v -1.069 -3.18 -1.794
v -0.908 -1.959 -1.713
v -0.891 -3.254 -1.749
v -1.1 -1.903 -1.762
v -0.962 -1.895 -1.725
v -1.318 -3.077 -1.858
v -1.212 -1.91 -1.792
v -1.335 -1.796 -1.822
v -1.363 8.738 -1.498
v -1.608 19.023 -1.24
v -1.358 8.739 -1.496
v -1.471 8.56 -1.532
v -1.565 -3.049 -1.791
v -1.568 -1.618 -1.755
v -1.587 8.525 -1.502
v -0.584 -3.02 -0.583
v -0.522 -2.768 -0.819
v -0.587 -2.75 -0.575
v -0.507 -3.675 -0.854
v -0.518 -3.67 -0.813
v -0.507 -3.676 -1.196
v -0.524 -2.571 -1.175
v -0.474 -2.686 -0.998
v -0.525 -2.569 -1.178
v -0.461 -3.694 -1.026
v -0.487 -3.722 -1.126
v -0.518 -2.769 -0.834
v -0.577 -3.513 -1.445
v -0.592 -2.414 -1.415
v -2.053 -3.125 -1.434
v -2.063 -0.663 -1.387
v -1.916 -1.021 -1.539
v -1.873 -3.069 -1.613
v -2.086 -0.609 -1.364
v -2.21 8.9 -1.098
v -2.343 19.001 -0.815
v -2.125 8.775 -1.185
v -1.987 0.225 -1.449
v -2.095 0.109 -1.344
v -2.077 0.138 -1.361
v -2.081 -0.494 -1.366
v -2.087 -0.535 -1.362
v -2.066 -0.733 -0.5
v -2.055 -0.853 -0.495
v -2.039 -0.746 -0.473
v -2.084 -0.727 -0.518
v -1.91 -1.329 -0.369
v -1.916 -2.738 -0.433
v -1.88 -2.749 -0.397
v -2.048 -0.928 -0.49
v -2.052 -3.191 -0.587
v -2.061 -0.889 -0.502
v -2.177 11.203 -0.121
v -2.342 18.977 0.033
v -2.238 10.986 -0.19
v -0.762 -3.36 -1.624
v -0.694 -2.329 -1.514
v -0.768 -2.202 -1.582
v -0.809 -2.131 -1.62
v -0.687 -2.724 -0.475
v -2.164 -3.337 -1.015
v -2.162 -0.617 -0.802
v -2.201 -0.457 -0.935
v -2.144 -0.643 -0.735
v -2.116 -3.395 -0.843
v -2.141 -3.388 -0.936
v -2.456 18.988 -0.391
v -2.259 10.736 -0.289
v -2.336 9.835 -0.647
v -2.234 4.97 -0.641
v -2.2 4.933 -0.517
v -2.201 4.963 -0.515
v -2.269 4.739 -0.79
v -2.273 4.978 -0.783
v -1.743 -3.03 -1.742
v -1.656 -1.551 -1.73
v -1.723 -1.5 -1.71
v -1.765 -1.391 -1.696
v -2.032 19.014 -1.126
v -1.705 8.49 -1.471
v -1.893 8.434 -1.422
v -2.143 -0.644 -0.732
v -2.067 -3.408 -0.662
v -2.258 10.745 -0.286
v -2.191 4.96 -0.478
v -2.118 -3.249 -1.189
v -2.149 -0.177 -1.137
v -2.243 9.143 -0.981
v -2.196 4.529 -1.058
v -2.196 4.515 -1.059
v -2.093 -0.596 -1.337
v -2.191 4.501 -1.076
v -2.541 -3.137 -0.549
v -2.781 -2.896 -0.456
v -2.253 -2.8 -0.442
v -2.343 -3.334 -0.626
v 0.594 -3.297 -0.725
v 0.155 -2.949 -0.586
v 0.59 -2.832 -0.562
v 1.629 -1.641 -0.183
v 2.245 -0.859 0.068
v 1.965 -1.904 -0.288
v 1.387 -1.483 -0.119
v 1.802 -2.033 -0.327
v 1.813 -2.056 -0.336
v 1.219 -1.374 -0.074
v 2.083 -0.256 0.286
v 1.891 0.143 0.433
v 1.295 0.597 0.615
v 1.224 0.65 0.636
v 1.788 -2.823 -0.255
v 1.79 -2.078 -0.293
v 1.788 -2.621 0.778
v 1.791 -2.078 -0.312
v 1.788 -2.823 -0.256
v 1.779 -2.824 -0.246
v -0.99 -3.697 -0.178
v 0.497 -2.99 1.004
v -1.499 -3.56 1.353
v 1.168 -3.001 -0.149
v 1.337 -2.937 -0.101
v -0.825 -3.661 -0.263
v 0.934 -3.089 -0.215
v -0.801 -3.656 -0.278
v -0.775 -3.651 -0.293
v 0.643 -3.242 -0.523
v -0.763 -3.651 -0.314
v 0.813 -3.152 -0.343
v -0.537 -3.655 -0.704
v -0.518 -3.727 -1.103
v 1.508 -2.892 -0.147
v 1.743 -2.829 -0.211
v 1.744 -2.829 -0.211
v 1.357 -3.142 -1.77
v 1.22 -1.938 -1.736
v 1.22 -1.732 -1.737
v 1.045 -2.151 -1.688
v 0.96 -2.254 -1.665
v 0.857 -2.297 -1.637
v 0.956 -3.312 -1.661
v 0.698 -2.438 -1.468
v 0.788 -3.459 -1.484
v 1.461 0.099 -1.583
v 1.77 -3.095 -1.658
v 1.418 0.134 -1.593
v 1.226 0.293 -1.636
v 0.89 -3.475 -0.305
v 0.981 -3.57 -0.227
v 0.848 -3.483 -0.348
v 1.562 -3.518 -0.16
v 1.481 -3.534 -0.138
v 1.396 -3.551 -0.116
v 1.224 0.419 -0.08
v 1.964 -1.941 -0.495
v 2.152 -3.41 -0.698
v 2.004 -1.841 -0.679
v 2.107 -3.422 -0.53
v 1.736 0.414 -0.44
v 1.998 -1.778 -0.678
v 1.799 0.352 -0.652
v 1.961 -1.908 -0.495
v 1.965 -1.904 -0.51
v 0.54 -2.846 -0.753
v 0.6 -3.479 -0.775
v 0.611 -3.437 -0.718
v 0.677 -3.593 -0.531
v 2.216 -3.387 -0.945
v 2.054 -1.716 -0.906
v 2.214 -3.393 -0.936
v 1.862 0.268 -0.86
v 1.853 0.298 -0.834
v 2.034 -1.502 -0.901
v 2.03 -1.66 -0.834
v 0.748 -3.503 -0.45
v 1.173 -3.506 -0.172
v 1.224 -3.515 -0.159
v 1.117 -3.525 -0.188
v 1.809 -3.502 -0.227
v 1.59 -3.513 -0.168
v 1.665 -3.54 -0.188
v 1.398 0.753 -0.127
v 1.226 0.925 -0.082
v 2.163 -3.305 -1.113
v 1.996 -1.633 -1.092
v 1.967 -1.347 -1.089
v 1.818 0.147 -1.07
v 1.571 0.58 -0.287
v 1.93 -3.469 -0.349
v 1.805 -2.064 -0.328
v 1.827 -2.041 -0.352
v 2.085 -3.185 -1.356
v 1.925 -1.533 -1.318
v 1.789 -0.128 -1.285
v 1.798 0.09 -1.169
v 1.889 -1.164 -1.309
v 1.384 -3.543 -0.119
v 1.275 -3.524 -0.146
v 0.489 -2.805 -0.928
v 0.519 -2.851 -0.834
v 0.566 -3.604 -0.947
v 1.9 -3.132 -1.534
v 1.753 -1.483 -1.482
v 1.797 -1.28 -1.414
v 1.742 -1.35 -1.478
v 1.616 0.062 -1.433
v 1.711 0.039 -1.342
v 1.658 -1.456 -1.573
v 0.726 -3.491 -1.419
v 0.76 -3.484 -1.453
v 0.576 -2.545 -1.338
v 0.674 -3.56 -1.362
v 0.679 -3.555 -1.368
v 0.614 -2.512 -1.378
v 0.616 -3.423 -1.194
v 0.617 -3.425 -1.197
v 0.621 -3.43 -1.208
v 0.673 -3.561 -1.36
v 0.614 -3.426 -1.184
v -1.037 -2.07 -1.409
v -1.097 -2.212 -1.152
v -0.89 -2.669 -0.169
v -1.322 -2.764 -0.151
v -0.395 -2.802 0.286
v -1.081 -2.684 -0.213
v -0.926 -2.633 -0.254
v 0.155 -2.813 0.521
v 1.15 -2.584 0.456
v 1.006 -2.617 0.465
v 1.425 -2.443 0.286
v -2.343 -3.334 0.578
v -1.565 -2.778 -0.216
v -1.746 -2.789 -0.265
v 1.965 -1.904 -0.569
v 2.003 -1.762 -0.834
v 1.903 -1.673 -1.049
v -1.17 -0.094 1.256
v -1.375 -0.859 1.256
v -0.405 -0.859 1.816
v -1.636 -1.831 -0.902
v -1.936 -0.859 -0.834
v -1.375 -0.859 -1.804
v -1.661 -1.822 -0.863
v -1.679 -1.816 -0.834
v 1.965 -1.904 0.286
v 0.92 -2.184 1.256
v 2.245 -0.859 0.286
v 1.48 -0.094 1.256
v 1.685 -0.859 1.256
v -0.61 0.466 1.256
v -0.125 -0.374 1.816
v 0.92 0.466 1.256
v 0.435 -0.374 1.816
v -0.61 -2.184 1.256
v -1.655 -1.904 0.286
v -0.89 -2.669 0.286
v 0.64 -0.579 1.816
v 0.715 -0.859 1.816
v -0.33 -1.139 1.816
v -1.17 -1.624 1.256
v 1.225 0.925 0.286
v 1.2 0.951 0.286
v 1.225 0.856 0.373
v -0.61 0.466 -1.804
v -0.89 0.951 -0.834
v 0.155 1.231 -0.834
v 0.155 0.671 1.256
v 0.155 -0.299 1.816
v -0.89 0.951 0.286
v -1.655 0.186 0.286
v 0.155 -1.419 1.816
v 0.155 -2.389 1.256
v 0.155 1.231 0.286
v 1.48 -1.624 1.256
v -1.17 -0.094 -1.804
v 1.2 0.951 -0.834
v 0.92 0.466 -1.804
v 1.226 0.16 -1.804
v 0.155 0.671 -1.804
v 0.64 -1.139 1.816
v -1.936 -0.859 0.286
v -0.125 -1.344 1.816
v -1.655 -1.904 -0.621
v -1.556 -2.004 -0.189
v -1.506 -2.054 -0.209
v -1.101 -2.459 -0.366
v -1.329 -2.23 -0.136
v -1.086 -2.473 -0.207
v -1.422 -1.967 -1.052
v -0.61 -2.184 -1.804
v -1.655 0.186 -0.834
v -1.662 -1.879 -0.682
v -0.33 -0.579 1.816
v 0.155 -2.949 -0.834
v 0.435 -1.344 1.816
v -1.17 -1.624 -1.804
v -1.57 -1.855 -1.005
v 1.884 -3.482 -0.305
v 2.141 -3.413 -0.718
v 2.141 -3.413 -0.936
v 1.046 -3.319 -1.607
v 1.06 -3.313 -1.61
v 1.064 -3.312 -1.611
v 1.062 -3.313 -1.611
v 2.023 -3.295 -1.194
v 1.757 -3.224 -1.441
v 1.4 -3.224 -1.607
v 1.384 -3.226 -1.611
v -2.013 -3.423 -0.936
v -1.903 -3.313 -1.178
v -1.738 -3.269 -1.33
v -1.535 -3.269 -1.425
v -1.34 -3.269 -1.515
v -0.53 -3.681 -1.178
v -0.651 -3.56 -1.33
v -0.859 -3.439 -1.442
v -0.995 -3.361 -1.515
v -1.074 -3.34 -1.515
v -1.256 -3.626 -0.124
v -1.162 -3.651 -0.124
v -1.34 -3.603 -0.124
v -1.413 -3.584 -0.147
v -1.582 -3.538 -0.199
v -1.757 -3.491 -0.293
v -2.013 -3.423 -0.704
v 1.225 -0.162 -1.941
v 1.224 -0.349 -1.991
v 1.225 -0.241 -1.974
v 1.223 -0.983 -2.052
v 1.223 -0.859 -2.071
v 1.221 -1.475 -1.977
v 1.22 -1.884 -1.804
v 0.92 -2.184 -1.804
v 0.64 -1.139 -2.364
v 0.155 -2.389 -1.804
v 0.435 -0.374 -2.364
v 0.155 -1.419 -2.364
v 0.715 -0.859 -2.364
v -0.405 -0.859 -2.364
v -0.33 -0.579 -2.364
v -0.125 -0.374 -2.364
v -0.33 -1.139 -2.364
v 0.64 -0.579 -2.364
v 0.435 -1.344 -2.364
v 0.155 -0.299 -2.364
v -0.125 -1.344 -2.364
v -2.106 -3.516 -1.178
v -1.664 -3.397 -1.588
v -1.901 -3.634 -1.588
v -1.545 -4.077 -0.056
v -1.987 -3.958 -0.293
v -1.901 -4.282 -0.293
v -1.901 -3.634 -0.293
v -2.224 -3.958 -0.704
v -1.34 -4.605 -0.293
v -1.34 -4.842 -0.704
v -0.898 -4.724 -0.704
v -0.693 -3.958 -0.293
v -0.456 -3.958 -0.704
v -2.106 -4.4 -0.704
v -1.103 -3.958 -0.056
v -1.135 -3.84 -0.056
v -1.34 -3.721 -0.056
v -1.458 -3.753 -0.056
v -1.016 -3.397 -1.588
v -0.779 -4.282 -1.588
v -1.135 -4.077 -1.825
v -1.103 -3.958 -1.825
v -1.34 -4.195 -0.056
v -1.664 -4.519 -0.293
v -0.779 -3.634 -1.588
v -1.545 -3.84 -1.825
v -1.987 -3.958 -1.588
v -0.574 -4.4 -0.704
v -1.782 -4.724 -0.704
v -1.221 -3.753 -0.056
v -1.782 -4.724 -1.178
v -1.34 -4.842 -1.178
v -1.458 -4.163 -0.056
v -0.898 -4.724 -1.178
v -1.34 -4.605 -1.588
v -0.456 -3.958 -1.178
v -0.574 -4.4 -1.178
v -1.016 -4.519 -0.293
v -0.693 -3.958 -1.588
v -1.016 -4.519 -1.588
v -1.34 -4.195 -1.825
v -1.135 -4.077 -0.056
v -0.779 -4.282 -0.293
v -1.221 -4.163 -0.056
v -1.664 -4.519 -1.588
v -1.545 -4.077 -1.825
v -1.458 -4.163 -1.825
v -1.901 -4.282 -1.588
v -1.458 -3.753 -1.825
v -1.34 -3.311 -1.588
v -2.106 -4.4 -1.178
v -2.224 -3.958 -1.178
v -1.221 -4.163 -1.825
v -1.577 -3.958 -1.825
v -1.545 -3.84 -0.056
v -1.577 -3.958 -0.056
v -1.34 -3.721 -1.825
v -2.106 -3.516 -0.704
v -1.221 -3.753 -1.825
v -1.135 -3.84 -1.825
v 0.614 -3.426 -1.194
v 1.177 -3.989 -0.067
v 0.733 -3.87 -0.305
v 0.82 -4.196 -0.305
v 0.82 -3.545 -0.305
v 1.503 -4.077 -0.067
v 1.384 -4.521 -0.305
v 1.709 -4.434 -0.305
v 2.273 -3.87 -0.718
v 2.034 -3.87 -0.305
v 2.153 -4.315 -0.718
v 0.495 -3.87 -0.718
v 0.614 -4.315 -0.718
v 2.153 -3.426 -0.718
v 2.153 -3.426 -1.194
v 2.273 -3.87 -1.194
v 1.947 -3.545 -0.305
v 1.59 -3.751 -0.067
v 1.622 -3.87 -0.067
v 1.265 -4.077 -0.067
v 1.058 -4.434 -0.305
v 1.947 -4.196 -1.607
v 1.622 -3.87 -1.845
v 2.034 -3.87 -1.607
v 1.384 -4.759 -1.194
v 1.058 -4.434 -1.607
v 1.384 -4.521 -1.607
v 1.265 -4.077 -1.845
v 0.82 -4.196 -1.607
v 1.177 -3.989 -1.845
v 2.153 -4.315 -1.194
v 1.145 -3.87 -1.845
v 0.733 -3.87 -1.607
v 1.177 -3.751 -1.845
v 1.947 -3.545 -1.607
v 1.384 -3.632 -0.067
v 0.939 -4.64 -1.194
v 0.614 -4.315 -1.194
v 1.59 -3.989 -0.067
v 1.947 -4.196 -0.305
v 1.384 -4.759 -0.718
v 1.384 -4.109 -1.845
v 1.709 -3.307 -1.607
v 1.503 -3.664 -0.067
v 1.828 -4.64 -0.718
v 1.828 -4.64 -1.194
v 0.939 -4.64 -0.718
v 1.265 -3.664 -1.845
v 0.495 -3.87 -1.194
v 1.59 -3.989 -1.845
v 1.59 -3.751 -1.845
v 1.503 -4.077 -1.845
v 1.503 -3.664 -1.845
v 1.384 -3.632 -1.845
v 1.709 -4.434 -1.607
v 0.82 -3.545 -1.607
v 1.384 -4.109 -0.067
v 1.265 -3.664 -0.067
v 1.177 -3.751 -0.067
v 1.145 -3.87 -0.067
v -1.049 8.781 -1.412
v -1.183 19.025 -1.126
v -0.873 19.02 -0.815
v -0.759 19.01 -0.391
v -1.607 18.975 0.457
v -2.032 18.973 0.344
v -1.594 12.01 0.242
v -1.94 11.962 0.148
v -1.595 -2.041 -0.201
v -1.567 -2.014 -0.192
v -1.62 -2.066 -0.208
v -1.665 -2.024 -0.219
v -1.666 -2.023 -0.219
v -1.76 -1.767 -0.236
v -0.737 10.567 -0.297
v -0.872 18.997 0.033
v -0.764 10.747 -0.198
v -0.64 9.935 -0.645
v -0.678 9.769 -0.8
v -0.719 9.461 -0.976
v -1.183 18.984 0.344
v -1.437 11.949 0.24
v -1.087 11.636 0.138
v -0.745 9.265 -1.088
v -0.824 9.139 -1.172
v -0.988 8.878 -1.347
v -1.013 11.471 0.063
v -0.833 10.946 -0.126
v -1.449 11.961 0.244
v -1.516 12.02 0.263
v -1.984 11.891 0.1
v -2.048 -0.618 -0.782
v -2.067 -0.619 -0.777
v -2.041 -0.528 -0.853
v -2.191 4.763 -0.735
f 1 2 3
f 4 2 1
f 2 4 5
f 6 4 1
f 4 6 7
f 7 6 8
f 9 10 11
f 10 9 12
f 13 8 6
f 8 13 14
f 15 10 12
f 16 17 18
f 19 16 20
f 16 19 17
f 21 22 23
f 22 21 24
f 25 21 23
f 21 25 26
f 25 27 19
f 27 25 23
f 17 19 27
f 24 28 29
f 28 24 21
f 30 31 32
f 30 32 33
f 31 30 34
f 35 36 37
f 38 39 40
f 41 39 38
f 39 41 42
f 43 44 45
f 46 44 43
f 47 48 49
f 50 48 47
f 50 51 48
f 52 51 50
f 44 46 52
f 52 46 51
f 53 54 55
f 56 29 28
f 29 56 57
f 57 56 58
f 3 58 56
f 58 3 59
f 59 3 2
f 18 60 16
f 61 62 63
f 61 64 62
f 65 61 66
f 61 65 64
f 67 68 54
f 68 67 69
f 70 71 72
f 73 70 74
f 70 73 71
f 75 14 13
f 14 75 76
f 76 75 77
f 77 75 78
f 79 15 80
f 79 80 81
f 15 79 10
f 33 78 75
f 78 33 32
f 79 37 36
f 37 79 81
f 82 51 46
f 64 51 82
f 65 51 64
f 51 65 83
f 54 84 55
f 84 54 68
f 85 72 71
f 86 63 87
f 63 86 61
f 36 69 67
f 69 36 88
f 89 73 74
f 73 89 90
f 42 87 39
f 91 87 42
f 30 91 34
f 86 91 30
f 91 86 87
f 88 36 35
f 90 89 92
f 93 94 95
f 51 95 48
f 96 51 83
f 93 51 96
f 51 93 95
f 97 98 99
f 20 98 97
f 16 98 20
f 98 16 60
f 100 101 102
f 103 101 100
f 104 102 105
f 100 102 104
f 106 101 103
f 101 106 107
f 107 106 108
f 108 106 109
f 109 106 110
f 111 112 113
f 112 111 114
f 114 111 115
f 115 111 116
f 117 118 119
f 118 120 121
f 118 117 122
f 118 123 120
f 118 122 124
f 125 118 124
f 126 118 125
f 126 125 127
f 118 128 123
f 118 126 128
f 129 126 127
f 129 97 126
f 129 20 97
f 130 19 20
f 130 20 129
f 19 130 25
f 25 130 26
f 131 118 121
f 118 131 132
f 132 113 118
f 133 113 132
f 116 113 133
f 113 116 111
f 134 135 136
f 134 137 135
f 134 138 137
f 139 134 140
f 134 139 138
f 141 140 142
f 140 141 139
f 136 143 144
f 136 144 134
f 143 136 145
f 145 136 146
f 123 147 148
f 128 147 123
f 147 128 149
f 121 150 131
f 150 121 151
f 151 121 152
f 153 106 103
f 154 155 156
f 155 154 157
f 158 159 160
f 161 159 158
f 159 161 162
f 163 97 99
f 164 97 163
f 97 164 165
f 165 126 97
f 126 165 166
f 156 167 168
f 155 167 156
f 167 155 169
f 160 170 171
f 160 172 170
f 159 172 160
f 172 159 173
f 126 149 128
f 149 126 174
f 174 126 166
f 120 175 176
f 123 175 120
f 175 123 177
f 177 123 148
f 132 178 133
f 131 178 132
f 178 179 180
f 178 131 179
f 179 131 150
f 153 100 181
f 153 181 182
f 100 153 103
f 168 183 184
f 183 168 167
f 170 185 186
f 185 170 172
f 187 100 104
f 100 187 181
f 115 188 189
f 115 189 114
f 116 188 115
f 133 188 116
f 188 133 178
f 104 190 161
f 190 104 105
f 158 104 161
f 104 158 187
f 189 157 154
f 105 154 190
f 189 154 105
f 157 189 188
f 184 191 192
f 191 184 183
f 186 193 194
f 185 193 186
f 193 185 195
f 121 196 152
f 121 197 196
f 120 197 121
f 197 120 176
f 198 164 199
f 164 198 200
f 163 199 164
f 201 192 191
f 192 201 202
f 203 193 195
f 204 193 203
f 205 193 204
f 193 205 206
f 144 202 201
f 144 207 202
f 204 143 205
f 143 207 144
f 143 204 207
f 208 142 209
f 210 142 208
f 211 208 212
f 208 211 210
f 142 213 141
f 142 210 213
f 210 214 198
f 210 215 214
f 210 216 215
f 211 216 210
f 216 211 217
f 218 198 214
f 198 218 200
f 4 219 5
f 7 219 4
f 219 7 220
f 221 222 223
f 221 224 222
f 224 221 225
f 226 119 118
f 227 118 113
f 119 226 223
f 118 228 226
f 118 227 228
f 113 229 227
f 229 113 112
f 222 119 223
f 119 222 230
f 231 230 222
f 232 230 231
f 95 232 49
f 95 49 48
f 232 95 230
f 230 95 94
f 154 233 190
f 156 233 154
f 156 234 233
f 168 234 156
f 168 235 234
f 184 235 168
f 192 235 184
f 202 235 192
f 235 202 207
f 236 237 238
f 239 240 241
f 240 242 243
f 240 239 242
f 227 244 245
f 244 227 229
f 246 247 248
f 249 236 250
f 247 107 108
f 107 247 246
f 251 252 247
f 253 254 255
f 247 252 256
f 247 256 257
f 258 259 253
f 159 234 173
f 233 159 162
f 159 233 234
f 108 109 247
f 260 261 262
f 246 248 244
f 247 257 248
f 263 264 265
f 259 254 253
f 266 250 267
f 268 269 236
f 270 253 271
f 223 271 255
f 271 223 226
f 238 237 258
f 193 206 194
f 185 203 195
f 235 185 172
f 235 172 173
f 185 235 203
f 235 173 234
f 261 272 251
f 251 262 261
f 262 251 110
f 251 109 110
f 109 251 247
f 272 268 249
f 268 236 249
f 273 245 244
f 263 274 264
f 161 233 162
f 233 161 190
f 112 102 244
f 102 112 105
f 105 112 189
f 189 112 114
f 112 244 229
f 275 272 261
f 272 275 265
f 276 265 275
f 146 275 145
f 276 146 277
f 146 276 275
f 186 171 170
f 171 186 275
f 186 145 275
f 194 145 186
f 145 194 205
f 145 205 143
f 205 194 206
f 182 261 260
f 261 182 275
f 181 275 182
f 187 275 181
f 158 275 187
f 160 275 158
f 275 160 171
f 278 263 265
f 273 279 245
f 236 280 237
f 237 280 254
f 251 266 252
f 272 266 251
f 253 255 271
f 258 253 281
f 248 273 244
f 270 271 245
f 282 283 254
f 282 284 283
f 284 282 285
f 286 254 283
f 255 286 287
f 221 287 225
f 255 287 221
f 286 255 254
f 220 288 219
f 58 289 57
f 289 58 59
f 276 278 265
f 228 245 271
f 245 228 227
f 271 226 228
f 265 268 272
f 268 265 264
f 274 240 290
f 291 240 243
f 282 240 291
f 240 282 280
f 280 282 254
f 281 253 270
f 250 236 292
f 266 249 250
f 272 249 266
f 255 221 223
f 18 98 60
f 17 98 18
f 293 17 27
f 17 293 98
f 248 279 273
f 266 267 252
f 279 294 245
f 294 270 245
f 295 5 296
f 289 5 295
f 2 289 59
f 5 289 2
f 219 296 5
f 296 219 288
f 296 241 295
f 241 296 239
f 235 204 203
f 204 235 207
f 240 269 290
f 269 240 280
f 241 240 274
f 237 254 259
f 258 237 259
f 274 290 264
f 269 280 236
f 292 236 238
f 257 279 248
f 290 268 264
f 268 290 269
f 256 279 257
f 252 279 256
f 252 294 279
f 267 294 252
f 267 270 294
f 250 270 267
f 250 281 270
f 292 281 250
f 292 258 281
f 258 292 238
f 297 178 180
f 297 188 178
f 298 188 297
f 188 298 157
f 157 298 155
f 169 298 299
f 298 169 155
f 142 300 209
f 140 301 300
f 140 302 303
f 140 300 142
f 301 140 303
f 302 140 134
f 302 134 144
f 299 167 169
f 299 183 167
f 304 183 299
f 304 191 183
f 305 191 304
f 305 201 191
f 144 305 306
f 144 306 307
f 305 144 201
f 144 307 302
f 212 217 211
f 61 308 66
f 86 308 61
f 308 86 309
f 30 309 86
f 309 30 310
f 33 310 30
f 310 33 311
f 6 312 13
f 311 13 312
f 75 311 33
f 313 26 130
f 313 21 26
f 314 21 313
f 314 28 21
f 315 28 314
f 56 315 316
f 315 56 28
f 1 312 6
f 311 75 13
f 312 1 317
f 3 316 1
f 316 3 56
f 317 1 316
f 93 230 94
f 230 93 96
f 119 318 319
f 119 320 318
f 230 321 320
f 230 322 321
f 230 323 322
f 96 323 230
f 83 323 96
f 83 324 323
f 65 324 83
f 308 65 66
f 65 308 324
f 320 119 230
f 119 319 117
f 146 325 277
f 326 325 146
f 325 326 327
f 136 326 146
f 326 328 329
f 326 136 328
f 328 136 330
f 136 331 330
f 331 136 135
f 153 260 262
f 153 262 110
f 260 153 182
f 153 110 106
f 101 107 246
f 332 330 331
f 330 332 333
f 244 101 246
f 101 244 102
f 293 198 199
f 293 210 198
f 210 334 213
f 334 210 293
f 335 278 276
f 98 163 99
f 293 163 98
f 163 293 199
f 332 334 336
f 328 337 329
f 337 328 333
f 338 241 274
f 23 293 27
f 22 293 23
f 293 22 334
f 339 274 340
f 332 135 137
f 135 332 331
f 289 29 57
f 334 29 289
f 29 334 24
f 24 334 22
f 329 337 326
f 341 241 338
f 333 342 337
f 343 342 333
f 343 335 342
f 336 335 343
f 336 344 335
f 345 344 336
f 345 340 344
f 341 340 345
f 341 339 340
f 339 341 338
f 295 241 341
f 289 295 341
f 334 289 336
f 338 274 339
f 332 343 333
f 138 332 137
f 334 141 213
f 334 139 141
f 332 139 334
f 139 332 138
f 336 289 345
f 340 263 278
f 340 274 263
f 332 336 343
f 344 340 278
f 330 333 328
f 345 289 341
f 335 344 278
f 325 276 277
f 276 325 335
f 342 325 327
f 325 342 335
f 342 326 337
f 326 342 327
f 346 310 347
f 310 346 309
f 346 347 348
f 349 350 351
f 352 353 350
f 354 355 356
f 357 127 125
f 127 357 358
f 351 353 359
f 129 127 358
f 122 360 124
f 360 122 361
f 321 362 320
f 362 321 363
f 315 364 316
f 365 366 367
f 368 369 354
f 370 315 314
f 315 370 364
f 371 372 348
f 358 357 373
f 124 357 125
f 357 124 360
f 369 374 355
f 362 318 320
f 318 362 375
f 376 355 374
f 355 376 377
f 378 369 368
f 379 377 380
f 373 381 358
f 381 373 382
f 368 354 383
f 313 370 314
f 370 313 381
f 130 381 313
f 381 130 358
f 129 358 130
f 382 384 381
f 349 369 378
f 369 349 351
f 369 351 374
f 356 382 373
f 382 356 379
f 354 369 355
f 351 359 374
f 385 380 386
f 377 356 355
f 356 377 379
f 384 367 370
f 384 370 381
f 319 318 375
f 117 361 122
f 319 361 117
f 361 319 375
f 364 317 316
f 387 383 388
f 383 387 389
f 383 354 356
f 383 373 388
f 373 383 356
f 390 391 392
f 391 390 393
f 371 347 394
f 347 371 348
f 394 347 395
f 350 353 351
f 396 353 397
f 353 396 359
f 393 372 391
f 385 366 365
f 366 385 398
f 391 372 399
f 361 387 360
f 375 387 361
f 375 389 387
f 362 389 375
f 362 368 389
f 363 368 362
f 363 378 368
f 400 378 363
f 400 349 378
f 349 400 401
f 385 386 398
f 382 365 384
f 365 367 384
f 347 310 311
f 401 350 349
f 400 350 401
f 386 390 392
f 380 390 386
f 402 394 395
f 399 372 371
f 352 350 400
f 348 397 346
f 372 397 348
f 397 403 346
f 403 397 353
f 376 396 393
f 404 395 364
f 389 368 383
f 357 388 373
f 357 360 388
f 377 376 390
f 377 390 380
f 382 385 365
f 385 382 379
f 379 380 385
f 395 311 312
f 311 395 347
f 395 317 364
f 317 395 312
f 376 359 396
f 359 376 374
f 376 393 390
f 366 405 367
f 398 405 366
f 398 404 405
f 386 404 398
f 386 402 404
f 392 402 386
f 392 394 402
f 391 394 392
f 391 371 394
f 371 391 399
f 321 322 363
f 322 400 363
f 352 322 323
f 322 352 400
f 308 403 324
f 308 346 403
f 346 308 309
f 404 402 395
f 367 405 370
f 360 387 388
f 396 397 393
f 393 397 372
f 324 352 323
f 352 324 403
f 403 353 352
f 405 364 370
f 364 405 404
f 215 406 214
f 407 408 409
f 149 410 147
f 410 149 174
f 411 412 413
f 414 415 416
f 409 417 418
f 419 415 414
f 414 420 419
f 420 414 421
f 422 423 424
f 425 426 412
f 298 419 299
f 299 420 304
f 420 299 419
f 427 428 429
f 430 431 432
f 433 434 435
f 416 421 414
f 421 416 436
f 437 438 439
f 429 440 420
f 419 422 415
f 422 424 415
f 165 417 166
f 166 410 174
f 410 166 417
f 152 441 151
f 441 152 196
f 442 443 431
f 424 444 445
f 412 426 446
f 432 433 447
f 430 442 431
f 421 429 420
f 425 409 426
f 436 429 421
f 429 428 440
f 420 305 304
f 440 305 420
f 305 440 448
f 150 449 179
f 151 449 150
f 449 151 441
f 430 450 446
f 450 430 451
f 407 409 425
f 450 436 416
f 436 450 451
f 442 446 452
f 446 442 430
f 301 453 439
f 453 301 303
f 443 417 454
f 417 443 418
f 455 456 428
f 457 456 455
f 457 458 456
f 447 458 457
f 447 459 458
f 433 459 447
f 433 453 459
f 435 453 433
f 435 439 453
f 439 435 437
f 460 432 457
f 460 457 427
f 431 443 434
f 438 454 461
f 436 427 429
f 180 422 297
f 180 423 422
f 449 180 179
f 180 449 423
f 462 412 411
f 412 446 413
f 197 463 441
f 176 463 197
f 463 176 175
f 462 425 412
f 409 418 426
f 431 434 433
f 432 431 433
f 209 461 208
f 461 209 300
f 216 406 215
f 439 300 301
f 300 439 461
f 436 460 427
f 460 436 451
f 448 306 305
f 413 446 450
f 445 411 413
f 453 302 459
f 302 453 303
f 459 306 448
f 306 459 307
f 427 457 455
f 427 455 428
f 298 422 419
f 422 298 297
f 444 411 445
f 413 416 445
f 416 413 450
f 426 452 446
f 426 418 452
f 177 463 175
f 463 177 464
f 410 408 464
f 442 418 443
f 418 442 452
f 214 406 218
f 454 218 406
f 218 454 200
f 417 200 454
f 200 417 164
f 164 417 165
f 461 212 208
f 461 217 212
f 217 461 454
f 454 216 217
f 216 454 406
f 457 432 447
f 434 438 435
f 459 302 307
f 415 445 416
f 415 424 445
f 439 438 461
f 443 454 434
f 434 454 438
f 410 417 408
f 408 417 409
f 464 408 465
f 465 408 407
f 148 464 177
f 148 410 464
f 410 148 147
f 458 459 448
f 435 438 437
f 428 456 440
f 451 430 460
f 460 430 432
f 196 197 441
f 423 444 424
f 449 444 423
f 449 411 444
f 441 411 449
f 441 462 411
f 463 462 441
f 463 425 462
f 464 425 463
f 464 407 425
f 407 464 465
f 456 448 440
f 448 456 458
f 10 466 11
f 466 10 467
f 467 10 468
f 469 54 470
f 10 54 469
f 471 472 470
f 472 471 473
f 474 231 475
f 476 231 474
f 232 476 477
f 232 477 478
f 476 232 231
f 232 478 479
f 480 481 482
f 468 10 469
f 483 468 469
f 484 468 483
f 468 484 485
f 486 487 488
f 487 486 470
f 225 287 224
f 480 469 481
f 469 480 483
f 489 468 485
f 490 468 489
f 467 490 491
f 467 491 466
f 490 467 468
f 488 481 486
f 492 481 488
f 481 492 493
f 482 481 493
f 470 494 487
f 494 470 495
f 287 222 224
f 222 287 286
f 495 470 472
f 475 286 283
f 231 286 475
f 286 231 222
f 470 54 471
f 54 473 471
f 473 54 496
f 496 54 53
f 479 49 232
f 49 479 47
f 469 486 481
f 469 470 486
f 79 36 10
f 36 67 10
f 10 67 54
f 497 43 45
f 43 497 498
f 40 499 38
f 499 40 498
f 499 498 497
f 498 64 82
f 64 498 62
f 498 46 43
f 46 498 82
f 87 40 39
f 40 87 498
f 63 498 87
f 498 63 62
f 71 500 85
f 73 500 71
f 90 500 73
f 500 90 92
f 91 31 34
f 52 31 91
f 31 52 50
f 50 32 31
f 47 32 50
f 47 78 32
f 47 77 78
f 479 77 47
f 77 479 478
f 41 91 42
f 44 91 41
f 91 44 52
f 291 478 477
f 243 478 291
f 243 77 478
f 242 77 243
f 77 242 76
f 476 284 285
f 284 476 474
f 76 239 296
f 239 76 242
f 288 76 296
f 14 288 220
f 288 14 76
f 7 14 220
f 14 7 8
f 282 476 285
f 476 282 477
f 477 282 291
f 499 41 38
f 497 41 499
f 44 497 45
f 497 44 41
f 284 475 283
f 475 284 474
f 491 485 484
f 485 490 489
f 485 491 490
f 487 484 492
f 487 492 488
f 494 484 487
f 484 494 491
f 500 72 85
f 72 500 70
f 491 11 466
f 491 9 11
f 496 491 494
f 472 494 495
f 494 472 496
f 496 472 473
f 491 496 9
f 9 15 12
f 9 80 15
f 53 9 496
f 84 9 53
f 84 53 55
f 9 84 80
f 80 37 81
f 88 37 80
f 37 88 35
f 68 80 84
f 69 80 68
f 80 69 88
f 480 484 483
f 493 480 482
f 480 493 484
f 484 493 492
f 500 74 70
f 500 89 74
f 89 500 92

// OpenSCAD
// Begin.
union() {
intersection() {
union() {
rotate([0, 1.33167, -84.4706])
translate([0, 1.0478, -0.861823])
rotate([0, 90, 0])
cylinder(h = 38, r1 = 0.83157, r2 = 0.83157, center = true, $fn = 12);

intersection() {
union() {
rotate([0, 1.60165, -89.2491])
translate([0, -1.35832, -0.92254])
rotate([0, 90, 0])
cylinder(h = 38, r1 = 0.84876, r2 = 0.84876, center = true, $fn = 12);

rotate([-160.564, 0, 6.19356])
translate([0, 0, -9.7143])
cube(size = [38, 38, 18.5714], center = true);
}

difference() {
rotate([-0, -0.068182, -0.155845])
translate([-8.60211, 0, 0])
cube(size = [20.7958, 38, 38], center = true);

rotate([169.451, 0, 17.7444])
translate([0, 11.0662, 0])
cube(size = [38, 15.8676, 38], center = true);
}
}
}

difference() {
translate([0.04541, 0.80336, 0.34418])
sphere(r = 4.9462, $fn = 12);

union() {
rotate([0, 26.4329, -78.8553])
translate([0, 0.351596, -3.53207])
rotate([0, 90, 0])
cylinder(h = 38, r1 = 1.74269, r2 = 1.74269, center = true, $fn = 12);

difference() {
rotate([-153.567, 0, 11.1447])
translate([0, -8.36688, 0])
cube(size = [38, 21.2662, 38], center = true);

translate([0.15454, -0.85904, -0.27445])
sphere(r = 2.16377, $fn = 12);
}
}
}
}

union() {
union() {
difference() {
translate([0.15454, -0.85904, -0.27445])
sphere(r = 2.16377, $fn = 12);

difference() {
rotate([-0, -0.068182, -0.155845])
translate([10.1115, 0, 0])
cube(size = [17.777, 38, 38], center = true);

rotate([-160.564, 0, 6.19356])
translate([0, 0, -9.7143])
cube(size = [38, 38, 18.5714], center = true);
}
}

union() {
union() {
translate([-1.33994, -3.95809, -0.94065])
sphere(r = 0.91553, $fn = 12);

translate([1.38362, -3.87033, -0.95589])
sphere(r = 0.92033, $fn = 12);
}

difference() {
translate([-1.33994, -3.95809, -0.94065])
sphere(r = 0.91553, $fn = 12);

rotate([0, 1.33167, -84.4706])
translate([0, 1.0478, -0.861823])
rotate([0, 90, 0])
cylinder(h = 38, r1 = 0.83157, r2 = 0.83157, center = true, $fn = 12);
}
}
}

intersection() {
difference() {
difference() {
rotate([0, 1.60165, -89.2491])
translate([0, -1.35832, -0.92254])
rotate([0, 90, 0])
cylinder(h = 38, r1 = 0.84876, r2 = 0.84876, center = true, $fn = 12);

translate([-2.10784, 2.61544, -2.50246])
rotate([0, 7.34194, -89.2836])
rotate([0, 90, 0])
rotate_extrude($fn = 12)
translate([3.84969, 0, 0])
circle(r = 3.45, $fn = 12);
}

rotate([0, -70.564, -83.8064])
translate([-9.2857, -0.126678, -0.790822])
rotate([0, 90, 0])
cylinder(h = 19.4286, r1 = 2.01835, r2 = 2.01835, center = true, $fn = 12);
}

difference() {
rotate([-153.567, 0, 11.1447])
translate([0, -8.36688, 0])
cube(size = [38, 21.2662, 38], center = true);

rotate([0, 26.4329, -78.8553])
translate([-8.36688, 0.351596, -3.53207])
rotate([0, 90, 0])
cylinder(h = 21.2662, r1 = 1.74269, r2 = 1.74269, center = true, $fn = 12);
}
}
}
}
// End.
